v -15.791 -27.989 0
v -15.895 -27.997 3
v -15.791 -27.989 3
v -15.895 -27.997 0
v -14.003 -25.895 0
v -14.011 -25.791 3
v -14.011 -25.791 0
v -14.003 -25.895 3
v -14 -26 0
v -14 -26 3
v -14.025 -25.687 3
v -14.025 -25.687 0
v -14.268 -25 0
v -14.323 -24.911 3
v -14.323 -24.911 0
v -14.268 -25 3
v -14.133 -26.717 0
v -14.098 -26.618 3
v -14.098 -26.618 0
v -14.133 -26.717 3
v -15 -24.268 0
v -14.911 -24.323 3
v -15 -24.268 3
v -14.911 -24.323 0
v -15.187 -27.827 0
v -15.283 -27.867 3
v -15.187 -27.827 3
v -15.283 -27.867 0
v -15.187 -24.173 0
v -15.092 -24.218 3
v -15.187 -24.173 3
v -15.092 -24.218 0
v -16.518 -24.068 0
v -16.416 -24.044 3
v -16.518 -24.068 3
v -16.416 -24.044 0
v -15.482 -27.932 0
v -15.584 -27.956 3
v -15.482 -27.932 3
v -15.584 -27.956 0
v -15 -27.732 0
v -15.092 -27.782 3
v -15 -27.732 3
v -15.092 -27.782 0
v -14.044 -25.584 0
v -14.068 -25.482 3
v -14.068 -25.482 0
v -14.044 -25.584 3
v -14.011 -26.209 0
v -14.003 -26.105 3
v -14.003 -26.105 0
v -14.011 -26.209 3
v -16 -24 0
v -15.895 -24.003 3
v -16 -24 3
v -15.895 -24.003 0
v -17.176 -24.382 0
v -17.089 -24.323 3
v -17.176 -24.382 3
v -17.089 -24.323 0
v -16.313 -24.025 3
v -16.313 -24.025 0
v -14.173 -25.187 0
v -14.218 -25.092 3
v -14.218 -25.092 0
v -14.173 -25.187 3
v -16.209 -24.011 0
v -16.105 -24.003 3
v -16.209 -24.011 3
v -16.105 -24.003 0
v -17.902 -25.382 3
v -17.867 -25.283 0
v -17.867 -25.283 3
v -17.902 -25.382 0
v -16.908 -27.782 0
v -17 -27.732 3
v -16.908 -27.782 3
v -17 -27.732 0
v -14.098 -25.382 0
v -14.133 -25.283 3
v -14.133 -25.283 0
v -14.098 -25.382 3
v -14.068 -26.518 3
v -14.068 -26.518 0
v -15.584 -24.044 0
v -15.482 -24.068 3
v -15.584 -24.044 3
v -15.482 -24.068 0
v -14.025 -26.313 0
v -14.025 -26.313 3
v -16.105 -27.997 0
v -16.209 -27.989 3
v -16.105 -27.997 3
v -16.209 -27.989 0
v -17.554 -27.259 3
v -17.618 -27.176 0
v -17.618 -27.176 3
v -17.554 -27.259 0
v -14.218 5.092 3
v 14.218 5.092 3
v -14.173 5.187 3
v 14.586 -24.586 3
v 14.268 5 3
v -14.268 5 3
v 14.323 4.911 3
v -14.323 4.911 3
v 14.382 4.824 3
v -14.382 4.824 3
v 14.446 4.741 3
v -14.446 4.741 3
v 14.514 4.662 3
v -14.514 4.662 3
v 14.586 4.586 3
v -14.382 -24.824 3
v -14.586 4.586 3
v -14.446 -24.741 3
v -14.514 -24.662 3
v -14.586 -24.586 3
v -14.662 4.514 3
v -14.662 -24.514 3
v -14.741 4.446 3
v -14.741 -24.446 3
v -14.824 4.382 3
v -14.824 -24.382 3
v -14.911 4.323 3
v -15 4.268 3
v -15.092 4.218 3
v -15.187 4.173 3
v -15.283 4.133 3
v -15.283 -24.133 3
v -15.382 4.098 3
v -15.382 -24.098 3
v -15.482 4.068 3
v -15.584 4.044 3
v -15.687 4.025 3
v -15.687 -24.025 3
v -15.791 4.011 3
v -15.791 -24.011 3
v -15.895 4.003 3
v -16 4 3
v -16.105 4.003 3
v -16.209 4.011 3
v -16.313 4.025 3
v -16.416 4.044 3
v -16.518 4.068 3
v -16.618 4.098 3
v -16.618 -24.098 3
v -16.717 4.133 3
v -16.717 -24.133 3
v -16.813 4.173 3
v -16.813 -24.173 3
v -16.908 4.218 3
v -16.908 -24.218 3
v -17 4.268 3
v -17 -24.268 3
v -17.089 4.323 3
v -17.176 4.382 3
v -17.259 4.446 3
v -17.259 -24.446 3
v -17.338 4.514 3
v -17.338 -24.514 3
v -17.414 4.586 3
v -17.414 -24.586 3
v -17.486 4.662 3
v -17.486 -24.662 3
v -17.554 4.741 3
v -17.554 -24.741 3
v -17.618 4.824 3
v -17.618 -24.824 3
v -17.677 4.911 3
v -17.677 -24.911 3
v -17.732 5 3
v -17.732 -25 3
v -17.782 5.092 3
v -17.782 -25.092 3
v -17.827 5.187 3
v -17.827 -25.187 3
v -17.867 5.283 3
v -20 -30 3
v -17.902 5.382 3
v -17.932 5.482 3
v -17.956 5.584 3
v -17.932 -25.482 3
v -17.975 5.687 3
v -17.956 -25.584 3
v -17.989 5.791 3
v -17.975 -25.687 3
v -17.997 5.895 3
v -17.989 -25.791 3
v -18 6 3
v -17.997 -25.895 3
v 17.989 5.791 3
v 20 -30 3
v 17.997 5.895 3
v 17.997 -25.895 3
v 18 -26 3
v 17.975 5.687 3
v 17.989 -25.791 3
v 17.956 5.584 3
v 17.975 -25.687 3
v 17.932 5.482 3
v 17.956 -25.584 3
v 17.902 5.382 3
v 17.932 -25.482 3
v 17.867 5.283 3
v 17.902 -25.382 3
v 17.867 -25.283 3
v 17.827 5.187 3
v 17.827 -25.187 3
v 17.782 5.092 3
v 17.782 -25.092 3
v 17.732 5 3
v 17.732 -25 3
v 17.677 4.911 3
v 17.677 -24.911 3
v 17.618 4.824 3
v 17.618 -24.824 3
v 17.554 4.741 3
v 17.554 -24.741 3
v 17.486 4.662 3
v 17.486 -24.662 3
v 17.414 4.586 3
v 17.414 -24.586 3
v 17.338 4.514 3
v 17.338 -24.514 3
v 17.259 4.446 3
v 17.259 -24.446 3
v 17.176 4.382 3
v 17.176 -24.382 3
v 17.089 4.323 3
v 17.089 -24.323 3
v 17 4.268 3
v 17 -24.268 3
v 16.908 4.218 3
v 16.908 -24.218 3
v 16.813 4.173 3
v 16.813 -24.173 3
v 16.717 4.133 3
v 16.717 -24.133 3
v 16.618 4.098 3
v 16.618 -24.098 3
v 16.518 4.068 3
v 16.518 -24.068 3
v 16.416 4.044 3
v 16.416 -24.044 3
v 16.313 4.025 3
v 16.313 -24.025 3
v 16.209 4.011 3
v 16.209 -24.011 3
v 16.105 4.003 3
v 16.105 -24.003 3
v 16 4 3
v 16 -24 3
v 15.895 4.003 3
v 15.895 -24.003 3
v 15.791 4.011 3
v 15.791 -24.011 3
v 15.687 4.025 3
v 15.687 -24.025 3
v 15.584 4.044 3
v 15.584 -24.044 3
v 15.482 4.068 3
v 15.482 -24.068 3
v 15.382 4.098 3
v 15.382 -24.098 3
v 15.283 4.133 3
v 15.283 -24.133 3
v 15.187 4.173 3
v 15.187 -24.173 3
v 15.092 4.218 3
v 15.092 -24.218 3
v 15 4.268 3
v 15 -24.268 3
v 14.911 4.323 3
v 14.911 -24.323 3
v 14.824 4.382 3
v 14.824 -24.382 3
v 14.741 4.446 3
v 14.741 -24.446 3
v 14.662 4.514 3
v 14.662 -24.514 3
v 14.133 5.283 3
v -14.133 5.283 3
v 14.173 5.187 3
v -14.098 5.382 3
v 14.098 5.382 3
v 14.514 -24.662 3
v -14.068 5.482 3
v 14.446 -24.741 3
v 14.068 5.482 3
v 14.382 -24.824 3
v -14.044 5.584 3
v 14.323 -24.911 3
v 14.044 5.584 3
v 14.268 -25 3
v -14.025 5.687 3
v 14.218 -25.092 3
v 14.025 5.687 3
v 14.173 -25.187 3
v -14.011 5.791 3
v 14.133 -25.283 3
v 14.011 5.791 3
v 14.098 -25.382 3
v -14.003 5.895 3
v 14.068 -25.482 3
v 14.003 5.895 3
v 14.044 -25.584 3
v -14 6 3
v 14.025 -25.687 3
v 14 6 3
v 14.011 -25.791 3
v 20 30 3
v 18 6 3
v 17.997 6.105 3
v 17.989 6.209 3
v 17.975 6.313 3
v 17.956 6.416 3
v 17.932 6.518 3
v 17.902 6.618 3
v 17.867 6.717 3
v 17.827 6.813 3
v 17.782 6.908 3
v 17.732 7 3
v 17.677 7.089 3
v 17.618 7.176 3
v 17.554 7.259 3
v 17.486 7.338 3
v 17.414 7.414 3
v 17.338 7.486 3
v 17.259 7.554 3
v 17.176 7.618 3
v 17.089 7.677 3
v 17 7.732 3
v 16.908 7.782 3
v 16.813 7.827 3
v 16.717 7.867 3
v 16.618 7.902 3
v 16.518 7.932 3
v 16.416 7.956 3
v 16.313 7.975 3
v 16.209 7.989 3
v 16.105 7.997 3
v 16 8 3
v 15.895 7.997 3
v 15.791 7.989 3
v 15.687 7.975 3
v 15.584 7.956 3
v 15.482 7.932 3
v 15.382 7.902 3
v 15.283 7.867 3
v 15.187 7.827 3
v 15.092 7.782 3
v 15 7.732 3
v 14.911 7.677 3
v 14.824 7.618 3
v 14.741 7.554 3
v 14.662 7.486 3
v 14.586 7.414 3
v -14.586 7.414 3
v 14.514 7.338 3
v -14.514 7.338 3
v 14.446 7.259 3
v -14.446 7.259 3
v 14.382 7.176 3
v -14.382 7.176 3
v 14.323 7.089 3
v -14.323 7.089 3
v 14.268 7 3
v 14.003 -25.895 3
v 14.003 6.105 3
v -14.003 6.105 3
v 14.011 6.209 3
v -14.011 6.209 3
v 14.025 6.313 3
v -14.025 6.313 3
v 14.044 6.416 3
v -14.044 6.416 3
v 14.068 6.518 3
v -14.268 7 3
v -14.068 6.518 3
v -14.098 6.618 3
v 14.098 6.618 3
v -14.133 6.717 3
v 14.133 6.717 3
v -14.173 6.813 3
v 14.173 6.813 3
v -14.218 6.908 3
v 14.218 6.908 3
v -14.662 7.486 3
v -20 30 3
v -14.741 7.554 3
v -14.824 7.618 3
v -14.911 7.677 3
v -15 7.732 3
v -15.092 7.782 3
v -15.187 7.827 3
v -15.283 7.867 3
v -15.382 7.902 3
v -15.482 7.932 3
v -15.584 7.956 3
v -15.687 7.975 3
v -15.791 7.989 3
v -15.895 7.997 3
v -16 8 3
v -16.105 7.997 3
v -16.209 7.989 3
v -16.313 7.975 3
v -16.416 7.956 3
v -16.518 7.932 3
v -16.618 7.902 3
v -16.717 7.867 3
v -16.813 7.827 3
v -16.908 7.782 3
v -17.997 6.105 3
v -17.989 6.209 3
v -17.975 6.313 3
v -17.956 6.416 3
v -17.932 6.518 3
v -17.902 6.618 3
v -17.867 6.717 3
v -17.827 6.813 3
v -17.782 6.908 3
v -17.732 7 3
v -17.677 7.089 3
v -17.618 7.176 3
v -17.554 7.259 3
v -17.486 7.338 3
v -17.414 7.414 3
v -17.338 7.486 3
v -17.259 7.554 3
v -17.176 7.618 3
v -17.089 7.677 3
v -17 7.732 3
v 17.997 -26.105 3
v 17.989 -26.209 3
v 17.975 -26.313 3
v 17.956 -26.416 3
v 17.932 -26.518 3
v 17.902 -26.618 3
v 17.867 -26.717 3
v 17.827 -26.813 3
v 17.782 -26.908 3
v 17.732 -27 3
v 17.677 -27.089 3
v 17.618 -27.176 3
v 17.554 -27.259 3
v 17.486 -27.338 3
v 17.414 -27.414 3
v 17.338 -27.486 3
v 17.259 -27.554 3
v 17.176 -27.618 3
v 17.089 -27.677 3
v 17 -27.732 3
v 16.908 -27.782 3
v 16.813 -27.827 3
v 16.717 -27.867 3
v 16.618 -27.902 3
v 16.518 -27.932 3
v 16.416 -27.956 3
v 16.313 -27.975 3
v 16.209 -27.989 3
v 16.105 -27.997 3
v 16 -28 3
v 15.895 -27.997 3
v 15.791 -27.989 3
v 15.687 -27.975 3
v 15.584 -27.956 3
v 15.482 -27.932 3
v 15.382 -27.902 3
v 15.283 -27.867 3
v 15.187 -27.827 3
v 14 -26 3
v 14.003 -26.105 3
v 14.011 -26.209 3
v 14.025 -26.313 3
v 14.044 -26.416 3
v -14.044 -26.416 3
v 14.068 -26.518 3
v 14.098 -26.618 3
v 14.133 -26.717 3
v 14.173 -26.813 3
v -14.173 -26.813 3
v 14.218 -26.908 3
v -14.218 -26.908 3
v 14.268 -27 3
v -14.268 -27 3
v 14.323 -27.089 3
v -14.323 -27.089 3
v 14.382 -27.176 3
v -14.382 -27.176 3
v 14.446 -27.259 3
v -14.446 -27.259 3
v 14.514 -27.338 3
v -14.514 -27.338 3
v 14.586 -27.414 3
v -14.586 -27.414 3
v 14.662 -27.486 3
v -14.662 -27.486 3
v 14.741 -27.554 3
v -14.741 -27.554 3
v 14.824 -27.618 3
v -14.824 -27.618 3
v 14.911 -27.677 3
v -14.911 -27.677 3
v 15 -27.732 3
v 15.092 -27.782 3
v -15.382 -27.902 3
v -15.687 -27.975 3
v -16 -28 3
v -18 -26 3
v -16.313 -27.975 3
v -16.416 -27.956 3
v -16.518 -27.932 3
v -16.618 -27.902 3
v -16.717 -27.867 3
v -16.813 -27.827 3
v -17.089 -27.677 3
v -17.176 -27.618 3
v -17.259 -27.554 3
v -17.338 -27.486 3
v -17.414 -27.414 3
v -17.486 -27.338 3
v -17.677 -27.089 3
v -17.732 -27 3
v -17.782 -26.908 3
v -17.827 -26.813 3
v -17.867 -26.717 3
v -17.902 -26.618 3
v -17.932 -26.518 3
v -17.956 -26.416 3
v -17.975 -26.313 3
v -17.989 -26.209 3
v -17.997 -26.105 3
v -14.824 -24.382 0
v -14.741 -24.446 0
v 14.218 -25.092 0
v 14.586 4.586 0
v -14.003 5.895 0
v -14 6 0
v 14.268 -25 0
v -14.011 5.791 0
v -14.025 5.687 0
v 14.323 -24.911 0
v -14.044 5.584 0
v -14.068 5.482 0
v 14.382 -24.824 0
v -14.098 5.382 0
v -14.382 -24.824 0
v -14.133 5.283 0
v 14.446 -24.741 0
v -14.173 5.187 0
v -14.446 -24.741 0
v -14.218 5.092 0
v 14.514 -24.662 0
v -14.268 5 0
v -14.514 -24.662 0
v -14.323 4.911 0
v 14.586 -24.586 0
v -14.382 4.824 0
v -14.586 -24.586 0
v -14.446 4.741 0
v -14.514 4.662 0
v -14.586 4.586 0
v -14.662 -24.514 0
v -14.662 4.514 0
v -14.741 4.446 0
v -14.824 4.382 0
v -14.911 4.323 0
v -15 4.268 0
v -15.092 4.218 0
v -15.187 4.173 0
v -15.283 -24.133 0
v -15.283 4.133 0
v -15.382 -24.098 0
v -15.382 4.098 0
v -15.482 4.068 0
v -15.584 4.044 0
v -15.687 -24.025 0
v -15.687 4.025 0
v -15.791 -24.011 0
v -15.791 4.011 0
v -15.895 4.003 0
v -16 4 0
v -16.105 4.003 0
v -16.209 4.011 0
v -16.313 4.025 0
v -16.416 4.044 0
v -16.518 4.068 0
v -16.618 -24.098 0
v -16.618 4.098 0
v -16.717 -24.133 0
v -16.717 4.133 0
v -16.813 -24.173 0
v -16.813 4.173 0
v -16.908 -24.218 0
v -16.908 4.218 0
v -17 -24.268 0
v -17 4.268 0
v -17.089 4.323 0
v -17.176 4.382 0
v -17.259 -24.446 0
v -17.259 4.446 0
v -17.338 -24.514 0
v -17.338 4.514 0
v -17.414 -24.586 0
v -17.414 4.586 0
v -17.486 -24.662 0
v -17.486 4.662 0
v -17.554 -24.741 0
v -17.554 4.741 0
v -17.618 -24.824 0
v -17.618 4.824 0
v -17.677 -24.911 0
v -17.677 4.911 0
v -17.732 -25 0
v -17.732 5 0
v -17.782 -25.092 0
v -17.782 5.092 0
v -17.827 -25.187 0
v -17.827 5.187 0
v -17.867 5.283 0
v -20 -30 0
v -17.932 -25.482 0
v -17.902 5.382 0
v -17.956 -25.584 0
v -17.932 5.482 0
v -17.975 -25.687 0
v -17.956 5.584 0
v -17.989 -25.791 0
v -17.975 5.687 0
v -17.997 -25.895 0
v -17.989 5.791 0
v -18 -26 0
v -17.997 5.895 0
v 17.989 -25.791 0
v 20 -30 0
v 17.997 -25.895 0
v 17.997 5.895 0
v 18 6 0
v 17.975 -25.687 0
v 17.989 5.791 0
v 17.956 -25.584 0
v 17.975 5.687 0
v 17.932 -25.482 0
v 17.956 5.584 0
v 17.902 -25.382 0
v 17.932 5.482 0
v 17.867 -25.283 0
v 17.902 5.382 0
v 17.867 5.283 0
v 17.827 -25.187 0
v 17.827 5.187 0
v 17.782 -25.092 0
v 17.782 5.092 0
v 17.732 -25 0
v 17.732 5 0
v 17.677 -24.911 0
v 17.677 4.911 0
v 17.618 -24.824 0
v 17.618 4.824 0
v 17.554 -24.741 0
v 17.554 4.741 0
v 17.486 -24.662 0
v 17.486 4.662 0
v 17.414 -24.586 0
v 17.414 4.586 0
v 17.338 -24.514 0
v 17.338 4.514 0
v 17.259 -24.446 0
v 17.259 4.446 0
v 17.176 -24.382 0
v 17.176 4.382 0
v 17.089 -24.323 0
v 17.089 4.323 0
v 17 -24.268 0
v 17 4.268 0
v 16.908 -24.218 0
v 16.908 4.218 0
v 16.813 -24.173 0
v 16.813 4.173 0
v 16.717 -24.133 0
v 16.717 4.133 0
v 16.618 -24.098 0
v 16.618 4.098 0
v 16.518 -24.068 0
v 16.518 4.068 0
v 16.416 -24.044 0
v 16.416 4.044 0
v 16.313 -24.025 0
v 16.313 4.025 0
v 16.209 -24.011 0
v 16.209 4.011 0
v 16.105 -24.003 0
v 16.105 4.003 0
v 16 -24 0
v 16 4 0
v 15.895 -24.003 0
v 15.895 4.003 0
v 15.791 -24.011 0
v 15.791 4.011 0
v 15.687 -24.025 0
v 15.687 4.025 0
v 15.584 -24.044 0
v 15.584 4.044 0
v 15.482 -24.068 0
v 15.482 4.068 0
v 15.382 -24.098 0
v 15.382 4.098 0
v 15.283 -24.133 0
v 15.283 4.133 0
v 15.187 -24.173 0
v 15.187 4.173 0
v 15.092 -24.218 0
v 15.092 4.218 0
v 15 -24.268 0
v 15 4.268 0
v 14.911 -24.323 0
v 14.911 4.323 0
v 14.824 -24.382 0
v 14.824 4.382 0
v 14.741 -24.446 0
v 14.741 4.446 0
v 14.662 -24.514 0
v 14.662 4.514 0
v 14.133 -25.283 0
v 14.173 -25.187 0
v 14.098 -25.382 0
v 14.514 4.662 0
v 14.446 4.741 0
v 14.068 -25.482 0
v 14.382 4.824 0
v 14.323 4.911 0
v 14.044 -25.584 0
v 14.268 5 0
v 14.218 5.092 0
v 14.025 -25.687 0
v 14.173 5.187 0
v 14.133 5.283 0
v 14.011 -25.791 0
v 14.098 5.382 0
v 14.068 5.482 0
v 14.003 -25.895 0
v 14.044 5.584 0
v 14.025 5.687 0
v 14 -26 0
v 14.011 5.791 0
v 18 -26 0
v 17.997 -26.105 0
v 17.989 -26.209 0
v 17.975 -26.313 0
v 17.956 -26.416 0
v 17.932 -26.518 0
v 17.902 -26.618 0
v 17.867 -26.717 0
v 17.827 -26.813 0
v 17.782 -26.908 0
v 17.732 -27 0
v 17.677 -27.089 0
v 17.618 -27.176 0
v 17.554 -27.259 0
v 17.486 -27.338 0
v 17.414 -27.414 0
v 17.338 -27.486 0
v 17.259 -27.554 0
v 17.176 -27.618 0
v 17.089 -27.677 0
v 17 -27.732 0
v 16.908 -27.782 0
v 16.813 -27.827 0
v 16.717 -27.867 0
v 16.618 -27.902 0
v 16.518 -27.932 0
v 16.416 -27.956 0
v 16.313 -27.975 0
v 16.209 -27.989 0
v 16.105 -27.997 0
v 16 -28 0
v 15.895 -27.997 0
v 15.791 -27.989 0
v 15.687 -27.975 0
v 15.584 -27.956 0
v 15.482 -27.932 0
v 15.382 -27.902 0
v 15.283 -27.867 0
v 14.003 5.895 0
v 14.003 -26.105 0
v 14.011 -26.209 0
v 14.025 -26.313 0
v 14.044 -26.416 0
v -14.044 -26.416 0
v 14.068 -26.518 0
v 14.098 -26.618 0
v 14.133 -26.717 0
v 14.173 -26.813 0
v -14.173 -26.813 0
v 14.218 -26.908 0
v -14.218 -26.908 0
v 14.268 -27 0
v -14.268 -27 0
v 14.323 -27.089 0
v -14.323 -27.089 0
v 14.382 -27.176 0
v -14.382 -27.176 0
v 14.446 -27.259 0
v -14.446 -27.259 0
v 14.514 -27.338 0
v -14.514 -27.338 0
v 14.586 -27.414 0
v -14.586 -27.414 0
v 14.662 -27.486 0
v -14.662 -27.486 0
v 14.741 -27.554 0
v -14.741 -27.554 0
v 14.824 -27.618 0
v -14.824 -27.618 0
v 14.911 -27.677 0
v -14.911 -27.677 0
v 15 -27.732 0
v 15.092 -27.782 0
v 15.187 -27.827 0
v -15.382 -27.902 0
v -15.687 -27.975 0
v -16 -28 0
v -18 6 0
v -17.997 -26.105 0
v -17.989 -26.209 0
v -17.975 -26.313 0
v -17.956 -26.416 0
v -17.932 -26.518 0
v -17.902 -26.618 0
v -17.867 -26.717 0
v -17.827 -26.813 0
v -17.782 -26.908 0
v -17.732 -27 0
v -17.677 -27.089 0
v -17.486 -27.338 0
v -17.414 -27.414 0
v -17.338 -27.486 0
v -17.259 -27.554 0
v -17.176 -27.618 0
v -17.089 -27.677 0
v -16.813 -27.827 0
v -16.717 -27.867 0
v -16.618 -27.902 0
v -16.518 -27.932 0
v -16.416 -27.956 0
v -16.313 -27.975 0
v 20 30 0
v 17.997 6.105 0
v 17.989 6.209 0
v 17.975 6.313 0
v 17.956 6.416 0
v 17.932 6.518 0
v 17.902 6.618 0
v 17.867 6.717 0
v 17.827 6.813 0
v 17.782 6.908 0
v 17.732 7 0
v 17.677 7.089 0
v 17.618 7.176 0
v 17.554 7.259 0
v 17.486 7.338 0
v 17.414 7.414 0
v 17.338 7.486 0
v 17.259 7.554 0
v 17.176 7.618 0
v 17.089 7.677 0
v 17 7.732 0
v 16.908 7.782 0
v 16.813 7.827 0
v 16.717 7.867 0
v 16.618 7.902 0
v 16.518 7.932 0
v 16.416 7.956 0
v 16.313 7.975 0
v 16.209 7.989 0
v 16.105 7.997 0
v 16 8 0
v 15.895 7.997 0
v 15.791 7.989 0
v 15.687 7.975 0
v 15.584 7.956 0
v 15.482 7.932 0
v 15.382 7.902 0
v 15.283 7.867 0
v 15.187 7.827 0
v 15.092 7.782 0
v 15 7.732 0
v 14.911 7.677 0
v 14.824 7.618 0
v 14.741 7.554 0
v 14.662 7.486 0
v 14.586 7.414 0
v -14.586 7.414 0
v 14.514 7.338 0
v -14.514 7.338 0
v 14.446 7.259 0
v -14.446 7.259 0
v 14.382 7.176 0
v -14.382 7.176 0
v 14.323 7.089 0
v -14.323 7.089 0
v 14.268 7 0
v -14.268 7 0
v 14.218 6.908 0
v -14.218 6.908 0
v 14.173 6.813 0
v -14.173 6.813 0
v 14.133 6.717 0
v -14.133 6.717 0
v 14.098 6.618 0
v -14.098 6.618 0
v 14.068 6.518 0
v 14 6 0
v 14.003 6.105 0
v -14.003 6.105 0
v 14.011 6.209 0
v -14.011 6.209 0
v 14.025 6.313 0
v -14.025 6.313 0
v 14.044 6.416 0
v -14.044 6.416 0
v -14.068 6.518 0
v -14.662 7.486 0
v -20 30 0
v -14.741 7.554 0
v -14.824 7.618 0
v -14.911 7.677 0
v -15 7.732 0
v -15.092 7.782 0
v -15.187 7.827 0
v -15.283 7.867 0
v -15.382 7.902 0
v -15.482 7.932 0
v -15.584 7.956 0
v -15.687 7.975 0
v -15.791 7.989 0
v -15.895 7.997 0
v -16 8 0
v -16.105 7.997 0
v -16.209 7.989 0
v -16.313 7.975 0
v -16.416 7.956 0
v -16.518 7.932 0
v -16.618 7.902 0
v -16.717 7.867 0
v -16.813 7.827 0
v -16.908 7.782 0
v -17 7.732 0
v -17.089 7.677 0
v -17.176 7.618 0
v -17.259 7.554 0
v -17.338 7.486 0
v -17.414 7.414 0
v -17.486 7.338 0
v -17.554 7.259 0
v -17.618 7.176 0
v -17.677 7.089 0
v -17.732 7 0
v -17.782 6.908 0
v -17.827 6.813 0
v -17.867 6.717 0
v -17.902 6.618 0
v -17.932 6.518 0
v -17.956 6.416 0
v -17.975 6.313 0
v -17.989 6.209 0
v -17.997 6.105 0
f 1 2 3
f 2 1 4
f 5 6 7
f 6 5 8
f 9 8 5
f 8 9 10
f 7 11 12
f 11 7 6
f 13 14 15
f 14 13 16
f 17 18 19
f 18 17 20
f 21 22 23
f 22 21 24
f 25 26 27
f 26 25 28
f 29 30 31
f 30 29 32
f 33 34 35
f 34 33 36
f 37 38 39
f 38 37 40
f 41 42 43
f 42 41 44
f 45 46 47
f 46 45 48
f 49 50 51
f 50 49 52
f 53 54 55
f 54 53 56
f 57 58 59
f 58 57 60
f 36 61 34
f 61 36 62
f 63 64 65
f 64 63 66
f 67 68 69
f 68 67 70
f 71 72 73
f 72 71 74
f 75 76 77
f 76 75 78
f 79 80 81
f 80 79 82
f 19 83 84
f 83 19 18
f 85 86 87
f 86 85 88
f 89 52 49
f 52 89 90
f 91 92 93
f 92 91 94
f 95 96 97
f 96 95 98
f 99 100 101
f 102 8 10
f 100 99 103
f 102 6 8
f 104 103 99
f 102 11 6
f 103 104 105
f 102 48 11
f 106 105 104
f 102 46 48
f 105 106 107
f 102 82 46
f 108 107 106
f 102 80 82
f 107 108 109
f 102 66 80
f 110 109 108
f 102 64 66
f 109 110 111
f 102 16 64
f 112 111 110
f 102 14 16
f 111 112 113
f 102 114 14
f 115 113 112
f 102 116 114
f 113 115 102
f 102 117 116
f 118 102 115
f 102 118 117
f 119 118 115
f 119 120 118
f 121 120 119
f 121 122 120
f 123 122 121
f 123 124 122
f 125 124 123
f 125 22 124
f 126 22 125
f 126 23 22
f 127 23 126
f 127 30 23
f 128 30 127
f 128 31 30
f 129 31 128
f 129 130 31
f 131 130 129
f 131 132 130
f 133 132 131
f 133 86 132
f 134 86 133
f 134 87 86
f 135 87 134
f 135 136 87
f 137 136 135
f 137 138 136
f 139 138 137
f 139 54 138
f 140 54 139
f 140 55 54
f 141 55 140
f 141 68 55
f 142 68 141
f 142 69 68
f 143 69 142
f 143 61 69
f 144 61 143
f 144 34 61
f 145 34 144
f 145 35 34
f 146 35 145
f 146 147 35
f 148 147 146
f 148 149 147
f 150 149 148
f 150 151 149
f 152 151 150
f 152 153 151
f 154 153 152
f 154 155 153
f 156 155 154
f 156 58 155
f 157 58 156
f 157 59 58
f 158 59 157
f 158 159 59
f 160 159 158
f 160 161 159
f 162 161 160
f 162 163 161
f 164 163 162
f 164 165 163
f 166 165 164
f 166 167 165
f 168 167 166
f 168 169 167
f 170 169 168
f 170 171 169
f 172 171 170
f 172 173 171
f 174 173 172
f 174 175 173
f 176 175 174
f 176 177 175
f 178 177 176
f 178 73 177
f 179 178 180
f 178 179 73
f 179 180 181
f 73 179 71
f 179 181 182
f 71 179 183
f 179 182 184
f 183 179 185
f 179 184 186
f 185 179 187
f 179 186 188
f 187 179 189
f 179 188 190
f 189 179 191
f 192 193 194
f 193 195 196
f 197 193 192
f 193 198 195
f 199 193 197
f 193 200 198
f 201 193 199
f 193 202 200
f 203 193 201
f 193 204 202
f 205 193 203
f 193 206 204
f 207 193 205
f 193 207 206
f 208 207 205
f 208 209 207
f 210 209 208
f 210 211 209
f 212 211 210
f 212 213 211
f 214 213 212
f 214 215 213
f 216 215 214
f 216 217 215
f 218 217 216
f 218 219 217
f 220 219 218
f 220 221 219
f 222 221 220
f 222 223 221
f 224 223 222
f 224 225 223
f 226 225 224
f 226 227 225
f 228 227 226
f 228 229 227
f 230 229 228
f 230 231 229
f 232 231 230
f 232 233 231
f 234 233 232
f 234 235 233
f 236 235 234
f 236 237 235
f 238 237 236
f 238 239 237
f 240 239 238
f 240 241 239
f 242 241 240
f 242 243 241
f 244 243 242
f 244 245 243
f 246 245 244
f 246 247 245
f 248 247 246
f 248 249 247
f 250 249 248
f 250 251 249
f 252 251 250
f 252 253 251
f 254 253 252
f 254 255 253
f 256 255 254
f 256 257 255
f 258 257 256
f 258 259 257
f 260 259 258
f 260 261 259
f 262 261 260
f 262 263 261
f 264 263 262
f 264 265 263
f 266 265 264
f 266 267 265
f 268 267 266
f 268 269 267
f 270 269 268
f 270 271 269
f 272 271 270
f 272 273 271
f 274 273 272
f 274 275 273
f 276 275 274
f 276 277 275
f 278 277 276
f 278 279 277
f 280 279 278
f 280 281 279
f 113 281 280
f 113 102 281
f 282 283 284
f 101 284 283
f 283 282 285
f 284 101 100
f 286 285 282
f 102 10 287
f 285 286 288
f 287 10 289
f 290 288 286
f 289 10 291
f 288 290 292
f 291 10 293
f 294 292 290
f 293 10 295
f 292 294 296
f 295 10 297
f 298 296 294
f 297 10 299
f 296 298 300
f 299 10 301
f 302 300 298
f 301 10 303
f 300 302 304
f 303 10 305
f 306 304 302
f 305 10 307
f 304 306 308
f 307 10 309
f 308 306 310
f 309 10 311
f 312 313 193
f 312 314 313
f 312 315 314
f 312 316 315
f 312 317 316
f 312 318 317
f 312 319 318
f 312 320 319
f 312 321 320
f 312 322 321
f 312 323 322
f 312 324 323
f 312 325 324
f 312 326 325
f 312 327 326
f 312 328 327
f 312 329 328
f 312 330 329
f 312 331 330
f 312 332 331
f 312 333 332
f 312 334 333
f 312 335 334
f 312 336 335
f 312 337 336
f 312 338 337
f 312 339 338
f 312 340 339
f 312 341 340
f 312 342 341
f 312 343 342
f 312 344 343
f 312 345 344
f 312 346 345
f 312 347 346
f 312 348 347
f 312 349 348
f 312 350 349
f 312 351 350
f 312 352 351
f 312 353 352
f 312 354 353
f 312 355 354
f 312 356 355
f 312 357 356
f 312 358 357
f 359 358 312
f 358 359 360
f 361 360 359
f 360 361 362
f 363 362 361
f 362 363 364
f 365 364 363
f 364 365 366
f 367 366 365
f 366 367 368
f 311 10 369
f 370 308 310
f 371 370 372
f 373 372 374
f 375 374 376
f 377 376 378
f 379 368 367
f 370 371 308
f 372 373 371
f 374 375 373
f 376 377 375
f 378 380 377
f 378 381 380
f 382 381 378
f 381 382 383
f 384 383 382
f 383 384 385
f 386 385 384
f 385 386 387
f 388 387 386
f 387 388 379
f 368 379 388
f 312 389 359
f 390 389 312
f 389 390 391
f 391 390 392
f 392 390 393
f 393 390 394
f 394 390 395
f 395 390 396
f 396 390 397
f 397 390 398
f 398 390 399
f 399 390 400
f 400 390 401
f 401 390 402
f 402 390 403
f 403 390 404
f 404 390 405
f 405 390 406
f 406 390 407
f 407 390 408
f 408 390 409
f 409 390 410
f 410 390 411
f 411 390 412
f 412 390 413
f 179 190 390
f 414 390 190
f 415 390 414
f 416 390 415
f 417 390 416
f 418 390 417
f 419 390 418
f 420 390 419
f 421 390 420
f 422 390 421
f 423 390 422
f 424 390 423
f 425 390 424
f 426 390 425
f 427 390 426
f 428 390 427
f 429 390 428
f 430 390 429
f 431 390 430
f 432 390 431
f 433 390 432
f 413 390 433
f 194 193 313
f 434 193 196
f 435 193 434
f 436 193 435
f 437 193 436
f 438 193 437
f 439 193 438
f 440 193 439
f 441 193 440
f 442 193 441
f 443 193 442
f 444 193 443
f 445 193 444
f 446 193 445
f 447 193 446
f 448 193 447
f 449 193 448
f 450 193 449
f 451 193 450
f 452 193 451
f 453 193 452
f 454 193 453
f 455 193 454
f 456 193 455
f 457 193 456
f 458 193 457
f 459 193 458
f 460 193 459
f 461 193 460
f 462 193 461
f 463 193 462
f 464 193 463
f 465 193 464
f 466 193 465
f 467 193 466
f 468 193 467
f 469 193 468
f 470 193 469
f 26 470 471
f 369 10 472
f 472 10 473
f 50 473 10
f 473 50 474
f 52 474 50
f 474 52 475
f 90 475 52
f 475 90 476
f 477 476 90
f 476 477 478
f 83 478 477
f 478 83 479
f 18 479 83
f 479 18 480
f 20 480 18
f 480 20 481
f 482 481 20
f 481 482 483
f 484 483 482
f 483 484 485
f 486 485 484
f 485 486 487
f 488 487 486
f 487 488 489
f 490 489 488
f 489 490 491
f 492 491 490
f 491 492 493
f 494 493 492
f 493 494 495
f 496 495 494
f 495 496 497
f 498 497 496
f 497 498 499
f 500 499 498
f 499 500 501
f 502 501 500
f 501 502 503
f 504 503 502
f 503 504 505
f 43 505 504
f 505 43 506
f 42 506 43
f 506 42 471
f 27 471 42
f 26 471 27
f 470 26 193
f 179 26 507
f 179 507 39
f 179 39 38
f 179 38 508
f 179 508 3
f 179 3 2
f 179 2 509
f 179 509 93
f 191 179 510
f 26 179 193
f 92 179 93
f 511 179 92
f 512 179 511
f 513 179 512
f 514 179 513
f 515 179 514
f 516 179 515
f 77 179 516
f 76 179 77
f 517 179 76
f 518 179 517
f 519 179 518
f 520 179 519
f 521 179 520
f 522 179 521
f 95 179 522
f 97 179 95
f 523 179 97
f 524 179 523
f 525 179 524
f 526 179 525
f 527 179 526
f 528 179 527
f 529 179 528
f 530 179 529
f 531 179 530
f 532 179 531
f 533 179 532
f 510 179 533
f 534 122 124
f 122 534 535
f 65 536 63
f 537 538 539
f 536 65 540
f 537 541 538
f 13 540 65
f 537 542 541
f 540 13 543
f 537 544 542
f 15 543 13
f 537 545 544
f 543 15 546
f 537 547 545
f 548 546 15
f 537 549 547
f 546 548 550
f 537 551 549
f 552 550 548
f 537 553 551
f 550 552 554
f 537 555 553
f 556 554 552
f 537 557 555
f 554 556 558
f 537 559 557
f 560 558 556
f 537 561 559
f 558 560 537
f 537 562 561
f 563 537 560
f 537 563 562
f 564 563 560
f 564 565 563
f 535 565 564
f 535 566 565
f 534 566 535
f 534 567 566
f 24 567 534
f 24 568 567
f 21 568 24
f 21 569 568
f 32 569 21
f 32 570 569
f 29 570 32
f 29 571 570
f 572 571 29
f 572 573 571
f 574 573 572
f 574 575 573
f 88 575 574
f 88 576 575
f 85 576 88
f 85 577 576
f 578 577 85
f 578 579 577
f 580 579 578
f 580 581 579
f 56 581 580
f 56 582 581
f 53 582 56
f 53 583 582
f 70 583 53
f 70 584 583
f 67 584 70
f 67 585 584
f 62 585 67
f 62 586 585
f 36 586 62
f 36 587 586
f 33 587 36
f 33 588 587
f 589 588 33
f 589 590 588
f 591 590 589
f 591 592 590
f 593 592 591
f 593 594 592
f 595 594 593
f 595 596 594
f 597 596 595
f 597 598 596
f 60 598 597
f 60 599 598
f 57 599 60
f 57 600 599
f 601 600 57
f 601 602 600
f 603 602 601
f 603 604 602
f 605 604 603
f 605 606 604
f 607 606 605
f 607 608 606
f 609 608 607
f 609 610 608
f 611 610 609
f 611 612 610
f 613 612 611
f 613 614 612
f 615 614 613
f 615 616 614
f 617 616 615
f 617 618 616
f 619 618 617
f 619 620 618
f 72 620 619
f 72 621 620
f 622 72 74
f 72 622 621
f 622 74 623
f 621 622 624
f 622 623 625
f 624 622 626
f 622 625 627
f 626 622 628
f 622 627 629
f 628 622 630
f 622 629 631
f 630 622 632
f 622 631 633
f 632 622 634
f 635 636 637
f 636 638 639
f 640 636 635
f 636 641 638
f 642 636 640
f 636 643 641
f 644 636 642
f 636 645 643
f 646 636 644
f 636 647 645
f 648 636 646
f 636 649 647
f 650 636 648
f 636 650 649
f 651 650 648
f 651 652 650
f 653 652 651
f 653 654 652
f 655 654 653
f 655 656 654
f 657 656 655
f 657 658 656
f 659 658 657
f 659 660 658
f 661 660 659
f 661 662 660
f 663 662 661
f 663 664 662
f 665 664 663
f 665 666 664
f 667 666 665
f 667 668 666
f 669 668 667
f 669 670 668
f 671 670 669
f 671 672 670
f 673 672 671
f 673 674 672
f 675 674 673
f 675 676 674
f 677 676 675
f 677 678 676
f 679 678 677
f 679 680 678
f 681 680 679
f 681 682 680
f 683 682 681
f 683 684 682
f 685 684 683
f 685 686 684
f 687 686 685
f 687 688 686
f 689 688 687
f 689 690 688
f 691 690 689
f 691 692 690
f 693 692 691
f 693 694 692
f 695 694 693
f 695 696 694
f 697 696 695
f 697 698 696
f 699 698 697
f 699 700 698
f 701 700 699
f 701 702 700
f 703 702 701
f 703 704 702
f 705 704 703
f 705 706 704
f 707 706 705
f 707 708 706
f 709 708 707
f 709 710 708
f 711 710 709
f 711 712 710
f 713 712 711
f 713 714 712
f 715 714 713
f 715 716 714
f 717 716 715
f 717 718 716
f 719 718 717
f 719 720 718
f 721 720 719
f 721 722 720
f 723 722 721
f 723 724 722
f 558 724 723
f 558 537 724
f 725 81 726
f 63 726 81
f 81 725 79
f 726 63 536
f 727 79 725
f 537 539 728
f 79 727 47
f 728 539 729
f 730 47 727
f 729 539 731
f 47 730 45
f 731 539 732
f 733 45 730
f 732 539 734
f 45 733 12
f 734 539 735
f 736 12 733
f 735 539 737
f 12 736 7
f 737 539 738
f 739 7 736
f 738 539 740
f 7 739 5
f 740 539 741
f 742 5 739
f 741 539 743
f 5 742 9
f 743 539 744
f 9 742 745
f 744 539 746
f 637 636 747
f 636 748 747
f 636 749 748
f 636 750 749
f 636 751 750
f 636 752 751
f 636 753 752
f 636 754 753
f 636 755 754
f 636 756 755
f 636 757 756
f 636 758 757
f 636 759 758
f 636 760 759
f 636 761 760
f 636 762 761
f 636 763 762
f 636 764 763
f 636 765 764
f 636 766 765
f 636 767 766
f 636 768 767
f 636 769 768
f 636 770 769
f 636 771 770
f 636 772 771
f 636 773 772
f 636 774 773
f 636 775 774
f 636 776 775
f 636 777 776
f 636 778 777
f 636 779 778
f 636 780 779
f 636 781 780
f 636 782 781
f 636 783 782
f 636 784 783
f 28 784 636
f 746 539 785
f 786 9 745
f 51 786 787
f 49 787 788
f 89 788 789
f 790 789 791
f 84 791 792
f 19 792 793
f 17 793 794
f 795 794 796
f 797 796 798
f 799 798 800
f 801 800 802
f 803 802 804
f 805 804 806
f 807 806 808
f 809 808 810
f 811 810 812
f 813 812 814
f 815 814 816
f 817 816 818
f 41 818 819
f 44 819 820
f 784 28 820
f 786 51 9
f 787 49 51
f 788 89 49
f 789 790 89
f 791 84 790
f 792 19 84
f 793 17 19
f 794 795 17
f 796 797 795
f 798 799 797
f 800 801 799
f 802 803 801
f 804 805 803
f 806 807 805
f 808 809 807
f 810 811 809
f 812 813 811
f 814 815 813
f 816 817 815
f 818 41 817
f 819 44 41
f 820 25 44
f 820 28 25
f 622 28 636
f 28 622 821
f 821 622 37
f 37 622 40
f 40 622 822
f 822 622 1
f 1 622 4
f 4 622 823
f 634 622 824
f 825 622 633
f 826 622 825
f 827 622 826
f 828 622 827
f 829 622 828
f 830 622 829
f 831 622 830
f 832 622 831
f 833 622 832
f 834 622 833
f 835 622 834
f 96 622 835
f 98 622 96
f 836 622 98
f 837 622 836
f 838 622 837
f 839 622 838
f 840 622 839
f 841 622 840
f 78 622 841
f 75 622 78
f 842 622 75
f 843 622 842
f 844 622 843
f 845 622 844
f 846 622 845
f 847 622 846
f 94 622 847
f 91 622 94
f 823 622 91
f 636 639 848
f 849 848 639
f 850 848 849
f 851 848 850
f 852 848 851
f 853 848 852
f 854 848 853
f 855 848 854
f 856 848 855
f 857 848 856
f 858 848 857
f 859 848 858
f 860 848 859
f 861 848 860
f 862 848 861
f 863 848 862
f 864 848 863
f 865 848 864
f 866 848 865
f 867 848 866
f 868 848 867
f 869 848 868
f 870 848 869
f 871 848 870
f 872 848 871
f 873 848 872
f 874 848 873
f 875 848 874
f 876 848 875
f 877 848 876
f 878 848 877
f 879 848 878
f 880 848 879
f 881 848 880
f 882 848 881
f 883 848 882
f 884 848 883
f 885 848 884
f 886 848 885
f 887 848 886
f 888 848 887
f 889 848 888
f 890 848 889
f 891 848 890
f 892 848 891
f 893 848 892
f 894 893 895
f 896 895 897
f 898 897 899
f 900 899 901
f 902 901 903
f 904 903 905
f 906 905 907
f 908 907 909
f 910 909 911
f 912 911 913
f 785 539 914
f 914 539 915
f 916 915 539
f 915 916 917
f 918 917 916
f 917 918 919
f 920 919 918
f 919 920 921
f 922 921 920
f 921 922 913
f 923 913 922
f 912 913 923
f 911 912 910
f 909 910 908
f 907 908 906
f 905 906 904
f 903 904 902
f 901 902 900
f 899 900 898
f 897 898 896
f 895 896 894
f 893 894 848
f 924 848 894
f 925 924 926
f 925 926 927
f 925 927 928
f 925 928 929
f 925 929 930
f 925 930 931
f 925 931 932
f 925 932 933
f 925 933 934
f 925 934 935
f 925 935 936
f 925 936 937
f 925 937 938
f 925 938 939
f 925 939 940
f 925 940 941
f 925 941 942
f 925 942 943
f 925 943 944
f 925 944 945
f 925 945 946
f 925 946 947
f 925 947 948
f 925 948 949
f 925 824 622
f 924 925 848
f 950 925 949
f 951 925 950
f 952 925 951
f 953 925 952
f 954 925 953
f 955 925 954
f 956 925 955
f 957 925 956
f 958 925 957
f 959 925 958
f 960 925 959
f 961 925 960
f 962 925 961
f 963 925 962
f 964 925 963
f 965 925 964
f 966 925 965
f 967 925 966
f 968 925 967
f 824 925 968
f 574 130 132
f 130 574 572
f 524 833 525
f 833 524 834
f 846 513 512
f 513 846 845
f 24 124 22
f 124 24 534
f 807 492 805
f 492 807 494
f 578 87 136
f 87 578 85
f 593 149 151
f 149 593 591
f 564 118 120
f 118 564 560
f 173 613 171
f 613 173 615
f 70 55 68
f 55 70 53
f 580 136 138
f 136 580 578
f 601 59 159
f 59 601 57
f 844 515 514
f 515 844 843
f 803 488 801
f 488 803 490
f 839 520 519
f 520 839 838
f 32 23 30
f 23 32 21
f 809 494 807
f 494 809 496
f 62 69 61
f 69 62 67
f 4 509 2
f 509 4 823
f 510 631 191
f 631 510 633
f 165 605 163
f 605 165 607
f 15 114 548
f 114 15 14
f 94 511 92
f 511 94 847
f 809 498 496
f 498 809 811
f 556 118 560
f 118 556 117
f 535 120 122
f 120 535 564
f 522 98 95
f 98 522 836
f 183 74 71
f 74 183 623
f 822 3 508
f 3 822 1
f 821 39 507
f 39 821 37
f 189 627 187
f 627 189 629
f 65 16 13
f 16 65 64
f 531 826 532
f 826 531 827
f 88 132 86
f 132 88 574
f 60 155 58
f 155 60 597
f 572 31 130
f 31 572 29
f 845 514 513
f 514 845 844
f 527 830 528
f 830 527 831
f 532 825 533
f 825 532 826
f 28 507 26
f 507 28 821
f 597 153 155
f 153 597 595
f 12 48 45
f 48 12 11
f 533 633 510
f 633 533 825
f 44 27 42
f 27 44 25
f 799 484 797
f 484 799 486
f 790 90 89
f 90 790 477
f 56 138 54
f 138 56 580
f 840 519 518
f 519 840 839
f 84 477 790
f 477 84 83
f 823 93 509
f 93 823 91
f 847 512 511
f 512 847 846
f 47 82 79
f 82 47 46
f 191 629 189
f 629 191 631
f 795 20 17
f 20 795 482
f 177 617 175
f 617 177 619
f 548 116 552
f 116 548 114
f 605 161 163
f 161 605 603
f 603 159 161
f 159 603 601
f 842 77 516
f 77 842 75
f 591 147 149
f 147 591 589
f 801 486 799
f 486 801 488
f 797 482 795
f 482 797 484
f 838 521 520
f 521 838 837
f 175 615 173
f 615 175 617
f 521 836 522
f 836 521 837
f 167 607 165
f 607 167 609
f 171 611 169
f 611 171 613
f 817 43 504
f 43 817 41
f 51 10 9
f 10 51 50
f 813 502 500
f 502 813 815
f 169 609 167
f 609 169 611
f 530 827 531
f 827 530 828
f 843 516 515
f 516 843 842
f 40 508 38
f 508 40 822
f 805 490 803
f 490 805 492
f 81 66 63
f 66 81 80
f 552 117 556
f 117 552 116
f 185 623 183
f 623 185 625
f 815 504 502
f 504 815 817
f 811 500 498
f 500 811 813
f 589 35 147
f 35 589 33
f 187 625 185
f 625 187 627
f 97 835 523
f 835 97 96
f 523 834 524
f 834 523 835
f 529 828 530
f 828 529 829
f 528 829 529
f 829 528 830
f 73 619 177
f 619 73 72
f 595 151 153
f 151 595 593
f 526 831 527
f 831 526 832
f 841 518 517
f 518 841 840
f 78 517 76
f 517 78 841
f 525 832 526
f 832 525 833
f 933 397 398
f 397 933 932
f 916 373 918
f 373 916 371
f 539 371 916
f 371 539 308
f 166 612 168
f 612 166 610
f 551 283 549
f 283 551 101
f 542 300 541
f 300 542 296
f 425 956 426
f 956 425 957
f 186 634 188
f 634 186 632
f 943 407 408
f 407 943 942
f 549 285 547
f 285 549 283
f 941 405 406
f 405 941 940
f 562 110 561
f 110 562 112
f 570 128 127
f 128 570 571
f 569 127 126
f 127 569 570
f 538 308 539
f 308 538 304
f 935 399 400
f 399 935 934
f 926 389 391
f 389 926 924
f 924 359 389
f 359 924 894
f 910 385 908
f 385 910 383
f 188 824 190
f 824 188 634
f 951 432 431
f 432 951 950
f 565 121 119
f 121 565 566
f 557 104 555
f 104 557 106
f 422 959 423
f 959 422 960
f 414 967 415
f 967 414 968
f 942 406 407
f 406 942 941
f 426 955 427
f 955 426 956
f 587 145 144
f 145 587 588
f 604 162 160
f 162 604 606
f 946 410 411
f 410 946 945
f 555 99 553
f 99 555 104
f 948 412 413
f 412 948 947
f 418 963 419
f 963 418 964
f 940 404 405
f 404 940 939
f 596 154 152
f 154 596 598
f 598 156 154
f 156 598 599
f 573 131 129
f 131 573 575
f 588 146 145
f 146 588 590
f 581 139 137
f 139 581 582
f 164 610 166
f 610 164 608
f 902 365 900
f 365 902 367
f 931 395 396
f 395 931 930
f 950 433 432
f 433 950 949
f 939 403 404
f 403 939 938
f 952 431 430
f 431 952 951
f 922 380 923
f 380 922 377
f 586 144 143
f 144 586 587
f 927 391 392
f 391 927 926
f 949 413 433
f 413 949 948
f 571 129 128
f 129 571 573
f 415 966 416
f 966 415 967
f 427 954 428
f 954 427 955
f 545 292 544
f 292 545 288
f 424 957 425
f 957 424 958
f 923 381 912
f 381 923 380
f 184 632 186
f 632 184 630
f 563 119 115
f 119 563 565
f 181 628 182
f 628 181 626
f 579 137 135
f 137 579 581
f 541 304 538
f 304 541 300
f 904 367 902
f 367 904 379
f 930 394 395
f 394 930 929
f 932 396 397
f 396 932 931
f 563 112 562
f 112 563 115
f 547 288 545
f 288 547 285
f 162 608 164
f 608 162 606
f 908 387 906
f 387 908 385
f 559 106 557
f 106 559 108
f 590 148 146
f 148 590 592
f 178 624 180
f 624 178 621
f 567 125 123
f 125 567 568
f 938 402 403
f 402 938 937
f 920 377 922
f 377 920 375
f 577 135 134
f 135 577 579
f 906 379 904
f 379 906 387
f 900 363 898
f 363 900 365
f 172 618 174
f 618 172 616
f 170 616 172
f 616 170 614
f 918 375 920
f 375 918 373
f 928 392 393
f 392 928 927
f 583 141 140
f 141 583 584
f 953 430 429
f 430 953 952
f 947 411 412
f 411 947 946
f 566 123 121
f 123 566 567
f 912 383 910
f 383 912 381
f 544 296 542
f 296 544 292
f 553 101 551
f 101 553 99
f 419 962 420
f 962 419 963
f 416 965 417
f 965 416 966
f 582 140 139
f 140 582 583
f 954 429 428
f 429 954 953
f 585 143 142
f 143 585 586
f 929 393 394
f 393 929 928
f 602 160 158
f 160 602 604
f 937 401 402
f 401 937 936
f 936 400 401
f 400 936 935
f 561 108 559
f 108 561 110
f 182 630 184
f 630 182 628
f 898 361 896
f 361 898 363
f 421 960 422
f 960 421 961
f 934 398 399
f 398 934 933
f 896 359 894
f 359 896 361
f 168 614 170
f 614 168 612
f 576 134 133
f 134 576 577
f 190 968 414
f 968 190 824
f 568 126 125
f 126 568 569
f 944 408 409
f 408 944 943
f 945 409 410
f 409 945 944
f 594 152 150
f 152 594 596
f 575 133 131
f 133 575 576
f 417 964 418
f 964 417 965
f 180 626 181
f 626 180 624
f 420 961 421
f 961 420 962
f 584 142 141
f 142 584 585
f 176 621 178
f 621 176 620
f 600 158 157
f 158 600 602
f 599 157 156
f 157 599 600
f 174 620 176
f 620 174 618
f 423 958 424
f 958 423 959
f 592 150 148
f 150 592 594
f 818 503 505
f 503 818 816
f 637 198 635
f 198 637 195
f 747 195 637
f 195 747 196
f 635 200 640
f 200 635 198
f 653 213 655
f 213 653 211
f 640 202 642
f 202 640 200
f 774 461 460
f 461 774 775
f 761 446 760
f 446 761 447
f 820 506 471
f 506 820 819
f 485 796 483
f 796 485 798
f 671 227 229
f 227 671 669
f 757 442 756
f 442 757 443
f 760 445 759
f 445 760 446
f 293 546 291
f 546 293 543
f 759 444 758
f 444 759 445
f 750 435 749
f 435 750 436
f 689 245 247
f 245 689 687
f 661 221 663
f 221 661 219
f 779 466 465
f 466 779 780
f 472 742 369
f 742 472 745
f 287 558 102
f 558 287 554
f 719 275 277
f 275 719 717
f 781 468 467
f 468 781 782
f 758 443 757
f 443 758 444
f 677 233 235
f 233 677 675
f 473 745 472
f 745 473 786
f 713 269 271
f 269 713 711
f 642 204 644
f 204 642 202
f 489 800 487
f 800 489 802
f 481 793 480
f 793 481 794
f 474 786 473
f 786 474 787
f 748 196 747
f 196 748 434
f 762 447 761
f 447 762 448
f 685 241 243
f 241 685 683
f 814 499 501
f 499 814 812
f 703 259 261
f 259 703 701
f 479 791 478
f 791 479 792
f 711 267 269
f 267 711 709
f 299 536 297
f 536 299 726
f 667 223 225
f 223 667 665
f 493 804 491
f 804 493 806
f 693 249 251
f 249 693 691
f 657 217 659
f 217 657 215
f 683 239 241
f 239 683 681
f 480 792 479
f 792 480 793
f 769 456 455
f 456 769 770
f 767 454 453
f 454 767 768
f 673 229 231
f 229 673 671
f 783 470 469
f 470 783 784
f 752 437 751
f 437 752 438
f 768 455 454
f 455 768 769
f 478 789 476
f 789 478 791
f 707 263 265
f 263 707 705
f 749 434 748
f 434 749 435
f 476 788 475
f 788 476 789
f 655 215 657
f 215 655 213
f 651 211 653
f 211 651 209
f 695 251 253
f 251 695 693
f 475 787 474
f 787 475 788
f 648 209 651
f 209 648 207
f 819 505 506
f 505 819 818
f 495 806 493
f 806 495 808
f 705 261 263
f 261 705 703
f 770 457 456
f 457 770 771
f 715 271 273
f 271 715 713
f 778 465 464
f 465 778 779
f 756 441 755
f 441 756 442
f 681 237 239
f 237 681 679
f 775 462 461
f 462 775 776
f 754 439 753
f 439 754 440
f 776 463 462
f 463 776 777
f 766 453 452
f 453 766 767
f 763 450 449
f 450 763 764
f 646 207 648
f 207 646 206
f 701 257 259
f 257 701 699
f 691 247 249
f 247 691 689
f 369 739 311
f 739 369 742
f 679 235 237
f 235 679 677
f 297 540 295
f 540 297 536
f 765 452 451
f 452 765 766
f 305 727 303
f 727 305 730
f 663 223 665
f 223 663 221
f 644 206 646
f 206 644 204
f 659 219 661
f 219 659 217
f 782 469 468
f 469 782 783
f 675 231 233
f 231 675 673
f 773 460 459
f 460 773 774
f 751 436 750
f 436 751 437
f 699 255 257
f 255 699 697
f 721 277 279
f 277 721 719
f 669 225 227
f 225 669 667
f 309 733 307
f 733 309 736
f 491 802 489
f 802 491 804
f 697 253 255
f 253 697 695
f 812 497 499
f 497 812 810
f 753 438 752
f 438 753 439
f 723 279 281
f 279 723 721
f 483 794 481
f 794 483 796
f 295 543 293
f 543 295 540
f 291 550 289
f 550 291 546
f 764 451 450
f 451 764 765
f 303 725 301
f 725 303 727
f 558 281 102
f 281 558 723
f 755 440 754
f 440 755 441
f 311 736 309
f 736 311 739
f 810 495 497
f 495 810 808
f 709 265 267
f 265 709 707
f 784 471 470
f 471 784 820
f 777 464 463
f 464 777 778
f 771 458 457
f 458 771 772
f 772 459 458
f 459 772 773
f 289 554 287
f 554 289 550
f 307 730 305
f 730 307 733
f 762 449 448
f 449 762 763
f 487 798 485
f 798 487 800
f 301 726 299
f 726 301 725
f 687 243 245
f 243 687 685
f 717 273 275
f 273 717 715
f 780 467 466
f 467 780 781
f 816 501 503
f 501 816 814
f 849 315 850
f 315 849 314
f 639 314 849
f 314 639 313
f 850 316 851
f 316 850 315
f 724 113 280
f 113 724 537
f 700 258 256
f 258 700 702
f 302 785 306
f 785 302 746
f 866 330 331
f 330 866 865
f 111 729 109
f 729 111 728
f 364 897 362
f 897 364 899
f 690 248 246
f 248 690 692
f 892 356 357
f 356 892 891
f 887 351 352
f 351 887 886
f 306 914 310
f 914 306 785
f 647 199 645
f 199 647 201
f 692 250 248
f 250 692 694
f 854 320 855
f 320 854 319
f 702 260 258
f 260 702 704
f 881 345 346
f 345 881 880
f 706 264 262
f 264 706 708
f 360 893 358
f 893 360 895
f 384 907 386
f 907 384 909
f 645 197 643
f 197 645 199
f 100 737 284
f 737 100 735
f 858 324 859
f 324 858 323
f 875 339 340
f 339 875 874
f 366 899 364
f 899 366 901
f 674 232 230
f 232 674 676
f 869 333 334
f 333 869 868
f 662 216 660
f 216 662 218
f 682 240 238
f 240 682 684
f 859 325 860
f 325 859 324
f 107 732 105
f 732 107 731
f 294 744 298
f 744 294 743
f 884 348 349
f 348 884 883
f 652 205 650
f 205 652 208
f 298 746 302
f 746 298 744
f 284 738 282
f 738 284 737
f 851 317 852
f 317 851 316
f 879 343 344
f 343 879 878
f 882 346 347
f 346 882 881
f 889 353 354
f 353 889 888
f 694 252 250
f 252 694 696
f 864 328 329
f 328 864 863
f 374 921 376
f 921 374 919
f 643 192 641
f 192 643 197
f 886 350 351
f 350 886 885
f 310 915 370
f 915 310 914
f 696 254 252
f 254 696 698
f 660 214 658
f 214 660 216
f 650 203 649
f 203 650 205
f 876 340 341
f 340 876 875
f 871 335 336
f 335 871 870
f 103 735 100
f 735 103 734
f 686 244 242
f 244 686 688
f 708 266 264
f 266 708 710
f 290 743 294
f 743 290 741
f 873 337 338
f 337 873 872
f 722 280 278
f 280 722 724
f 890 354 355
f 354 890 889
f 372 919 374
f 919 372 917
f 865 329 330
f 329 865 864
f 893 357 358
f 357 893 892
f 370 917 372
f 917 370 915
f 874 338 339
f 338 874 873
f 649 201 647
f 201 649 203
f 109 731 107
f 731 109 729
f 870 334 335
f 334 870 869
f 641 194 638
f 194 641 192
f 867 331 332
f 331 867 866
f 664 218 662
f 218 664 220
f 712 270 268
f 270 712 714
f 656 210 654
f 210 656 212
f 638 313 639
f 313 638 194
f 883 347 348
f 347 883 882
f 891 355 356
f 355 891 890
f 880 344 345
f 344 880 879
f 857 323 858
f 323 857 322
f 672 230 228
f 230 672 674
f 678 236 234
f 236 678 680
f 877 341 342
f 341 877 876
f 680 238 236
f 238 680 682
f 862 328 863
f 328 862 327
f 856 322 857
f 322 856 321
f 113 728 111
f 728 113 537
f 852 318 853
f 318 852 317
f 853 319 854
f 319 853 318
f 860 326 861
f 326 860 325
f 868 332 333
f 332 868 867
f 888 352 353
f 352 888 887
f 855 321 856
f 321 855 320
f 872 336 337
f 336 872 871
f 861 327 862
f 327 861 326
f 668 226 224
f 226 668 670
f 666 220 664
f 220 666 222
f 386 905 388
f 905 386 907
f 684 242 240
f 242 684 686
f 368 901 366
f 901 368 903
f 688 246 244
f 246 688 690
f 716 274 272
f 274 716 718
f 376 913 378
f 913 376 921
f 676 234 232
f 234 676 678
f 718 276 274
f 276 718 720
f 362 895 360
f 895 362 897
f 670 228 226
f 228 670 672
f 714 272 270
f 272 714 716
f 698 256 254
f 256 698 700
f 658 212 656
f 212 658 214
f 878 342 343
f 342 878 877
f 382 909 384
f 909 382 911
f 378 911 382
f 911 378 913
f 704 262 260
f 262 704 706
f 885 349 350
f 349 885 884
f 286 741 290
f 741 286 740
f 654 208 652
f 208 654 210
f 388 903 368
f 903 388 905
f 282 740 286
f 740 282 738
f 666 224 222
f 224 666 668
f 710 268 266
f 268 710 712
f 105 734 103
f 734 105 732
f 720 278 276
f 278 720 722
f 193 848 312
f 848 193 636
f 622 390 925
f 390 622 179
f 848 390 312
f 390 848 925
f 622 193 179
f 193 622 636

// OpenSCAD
$fn = 120;

module eport_dev_board_mount()
{
    screw_distance = 16;
    screw_y_offset = 10;
    height = 3;

    difference
    ()
    {
        union()
        {
            translate([0, 0, height/2])
            cube([40, 60, 3], center=true);
        }
        union()
        {
            for( x_translation = [-screw_distance, screw_distance] )
            {
                for( y_translation = [-screw_distance, screw_distance] )
                {
                    translate([x_translation, y_translation - screw_y_offset, 0])
                    cylinder(d=4, h=height);
                }
            }
        }
    }
}

eport_dev_board_mount();
